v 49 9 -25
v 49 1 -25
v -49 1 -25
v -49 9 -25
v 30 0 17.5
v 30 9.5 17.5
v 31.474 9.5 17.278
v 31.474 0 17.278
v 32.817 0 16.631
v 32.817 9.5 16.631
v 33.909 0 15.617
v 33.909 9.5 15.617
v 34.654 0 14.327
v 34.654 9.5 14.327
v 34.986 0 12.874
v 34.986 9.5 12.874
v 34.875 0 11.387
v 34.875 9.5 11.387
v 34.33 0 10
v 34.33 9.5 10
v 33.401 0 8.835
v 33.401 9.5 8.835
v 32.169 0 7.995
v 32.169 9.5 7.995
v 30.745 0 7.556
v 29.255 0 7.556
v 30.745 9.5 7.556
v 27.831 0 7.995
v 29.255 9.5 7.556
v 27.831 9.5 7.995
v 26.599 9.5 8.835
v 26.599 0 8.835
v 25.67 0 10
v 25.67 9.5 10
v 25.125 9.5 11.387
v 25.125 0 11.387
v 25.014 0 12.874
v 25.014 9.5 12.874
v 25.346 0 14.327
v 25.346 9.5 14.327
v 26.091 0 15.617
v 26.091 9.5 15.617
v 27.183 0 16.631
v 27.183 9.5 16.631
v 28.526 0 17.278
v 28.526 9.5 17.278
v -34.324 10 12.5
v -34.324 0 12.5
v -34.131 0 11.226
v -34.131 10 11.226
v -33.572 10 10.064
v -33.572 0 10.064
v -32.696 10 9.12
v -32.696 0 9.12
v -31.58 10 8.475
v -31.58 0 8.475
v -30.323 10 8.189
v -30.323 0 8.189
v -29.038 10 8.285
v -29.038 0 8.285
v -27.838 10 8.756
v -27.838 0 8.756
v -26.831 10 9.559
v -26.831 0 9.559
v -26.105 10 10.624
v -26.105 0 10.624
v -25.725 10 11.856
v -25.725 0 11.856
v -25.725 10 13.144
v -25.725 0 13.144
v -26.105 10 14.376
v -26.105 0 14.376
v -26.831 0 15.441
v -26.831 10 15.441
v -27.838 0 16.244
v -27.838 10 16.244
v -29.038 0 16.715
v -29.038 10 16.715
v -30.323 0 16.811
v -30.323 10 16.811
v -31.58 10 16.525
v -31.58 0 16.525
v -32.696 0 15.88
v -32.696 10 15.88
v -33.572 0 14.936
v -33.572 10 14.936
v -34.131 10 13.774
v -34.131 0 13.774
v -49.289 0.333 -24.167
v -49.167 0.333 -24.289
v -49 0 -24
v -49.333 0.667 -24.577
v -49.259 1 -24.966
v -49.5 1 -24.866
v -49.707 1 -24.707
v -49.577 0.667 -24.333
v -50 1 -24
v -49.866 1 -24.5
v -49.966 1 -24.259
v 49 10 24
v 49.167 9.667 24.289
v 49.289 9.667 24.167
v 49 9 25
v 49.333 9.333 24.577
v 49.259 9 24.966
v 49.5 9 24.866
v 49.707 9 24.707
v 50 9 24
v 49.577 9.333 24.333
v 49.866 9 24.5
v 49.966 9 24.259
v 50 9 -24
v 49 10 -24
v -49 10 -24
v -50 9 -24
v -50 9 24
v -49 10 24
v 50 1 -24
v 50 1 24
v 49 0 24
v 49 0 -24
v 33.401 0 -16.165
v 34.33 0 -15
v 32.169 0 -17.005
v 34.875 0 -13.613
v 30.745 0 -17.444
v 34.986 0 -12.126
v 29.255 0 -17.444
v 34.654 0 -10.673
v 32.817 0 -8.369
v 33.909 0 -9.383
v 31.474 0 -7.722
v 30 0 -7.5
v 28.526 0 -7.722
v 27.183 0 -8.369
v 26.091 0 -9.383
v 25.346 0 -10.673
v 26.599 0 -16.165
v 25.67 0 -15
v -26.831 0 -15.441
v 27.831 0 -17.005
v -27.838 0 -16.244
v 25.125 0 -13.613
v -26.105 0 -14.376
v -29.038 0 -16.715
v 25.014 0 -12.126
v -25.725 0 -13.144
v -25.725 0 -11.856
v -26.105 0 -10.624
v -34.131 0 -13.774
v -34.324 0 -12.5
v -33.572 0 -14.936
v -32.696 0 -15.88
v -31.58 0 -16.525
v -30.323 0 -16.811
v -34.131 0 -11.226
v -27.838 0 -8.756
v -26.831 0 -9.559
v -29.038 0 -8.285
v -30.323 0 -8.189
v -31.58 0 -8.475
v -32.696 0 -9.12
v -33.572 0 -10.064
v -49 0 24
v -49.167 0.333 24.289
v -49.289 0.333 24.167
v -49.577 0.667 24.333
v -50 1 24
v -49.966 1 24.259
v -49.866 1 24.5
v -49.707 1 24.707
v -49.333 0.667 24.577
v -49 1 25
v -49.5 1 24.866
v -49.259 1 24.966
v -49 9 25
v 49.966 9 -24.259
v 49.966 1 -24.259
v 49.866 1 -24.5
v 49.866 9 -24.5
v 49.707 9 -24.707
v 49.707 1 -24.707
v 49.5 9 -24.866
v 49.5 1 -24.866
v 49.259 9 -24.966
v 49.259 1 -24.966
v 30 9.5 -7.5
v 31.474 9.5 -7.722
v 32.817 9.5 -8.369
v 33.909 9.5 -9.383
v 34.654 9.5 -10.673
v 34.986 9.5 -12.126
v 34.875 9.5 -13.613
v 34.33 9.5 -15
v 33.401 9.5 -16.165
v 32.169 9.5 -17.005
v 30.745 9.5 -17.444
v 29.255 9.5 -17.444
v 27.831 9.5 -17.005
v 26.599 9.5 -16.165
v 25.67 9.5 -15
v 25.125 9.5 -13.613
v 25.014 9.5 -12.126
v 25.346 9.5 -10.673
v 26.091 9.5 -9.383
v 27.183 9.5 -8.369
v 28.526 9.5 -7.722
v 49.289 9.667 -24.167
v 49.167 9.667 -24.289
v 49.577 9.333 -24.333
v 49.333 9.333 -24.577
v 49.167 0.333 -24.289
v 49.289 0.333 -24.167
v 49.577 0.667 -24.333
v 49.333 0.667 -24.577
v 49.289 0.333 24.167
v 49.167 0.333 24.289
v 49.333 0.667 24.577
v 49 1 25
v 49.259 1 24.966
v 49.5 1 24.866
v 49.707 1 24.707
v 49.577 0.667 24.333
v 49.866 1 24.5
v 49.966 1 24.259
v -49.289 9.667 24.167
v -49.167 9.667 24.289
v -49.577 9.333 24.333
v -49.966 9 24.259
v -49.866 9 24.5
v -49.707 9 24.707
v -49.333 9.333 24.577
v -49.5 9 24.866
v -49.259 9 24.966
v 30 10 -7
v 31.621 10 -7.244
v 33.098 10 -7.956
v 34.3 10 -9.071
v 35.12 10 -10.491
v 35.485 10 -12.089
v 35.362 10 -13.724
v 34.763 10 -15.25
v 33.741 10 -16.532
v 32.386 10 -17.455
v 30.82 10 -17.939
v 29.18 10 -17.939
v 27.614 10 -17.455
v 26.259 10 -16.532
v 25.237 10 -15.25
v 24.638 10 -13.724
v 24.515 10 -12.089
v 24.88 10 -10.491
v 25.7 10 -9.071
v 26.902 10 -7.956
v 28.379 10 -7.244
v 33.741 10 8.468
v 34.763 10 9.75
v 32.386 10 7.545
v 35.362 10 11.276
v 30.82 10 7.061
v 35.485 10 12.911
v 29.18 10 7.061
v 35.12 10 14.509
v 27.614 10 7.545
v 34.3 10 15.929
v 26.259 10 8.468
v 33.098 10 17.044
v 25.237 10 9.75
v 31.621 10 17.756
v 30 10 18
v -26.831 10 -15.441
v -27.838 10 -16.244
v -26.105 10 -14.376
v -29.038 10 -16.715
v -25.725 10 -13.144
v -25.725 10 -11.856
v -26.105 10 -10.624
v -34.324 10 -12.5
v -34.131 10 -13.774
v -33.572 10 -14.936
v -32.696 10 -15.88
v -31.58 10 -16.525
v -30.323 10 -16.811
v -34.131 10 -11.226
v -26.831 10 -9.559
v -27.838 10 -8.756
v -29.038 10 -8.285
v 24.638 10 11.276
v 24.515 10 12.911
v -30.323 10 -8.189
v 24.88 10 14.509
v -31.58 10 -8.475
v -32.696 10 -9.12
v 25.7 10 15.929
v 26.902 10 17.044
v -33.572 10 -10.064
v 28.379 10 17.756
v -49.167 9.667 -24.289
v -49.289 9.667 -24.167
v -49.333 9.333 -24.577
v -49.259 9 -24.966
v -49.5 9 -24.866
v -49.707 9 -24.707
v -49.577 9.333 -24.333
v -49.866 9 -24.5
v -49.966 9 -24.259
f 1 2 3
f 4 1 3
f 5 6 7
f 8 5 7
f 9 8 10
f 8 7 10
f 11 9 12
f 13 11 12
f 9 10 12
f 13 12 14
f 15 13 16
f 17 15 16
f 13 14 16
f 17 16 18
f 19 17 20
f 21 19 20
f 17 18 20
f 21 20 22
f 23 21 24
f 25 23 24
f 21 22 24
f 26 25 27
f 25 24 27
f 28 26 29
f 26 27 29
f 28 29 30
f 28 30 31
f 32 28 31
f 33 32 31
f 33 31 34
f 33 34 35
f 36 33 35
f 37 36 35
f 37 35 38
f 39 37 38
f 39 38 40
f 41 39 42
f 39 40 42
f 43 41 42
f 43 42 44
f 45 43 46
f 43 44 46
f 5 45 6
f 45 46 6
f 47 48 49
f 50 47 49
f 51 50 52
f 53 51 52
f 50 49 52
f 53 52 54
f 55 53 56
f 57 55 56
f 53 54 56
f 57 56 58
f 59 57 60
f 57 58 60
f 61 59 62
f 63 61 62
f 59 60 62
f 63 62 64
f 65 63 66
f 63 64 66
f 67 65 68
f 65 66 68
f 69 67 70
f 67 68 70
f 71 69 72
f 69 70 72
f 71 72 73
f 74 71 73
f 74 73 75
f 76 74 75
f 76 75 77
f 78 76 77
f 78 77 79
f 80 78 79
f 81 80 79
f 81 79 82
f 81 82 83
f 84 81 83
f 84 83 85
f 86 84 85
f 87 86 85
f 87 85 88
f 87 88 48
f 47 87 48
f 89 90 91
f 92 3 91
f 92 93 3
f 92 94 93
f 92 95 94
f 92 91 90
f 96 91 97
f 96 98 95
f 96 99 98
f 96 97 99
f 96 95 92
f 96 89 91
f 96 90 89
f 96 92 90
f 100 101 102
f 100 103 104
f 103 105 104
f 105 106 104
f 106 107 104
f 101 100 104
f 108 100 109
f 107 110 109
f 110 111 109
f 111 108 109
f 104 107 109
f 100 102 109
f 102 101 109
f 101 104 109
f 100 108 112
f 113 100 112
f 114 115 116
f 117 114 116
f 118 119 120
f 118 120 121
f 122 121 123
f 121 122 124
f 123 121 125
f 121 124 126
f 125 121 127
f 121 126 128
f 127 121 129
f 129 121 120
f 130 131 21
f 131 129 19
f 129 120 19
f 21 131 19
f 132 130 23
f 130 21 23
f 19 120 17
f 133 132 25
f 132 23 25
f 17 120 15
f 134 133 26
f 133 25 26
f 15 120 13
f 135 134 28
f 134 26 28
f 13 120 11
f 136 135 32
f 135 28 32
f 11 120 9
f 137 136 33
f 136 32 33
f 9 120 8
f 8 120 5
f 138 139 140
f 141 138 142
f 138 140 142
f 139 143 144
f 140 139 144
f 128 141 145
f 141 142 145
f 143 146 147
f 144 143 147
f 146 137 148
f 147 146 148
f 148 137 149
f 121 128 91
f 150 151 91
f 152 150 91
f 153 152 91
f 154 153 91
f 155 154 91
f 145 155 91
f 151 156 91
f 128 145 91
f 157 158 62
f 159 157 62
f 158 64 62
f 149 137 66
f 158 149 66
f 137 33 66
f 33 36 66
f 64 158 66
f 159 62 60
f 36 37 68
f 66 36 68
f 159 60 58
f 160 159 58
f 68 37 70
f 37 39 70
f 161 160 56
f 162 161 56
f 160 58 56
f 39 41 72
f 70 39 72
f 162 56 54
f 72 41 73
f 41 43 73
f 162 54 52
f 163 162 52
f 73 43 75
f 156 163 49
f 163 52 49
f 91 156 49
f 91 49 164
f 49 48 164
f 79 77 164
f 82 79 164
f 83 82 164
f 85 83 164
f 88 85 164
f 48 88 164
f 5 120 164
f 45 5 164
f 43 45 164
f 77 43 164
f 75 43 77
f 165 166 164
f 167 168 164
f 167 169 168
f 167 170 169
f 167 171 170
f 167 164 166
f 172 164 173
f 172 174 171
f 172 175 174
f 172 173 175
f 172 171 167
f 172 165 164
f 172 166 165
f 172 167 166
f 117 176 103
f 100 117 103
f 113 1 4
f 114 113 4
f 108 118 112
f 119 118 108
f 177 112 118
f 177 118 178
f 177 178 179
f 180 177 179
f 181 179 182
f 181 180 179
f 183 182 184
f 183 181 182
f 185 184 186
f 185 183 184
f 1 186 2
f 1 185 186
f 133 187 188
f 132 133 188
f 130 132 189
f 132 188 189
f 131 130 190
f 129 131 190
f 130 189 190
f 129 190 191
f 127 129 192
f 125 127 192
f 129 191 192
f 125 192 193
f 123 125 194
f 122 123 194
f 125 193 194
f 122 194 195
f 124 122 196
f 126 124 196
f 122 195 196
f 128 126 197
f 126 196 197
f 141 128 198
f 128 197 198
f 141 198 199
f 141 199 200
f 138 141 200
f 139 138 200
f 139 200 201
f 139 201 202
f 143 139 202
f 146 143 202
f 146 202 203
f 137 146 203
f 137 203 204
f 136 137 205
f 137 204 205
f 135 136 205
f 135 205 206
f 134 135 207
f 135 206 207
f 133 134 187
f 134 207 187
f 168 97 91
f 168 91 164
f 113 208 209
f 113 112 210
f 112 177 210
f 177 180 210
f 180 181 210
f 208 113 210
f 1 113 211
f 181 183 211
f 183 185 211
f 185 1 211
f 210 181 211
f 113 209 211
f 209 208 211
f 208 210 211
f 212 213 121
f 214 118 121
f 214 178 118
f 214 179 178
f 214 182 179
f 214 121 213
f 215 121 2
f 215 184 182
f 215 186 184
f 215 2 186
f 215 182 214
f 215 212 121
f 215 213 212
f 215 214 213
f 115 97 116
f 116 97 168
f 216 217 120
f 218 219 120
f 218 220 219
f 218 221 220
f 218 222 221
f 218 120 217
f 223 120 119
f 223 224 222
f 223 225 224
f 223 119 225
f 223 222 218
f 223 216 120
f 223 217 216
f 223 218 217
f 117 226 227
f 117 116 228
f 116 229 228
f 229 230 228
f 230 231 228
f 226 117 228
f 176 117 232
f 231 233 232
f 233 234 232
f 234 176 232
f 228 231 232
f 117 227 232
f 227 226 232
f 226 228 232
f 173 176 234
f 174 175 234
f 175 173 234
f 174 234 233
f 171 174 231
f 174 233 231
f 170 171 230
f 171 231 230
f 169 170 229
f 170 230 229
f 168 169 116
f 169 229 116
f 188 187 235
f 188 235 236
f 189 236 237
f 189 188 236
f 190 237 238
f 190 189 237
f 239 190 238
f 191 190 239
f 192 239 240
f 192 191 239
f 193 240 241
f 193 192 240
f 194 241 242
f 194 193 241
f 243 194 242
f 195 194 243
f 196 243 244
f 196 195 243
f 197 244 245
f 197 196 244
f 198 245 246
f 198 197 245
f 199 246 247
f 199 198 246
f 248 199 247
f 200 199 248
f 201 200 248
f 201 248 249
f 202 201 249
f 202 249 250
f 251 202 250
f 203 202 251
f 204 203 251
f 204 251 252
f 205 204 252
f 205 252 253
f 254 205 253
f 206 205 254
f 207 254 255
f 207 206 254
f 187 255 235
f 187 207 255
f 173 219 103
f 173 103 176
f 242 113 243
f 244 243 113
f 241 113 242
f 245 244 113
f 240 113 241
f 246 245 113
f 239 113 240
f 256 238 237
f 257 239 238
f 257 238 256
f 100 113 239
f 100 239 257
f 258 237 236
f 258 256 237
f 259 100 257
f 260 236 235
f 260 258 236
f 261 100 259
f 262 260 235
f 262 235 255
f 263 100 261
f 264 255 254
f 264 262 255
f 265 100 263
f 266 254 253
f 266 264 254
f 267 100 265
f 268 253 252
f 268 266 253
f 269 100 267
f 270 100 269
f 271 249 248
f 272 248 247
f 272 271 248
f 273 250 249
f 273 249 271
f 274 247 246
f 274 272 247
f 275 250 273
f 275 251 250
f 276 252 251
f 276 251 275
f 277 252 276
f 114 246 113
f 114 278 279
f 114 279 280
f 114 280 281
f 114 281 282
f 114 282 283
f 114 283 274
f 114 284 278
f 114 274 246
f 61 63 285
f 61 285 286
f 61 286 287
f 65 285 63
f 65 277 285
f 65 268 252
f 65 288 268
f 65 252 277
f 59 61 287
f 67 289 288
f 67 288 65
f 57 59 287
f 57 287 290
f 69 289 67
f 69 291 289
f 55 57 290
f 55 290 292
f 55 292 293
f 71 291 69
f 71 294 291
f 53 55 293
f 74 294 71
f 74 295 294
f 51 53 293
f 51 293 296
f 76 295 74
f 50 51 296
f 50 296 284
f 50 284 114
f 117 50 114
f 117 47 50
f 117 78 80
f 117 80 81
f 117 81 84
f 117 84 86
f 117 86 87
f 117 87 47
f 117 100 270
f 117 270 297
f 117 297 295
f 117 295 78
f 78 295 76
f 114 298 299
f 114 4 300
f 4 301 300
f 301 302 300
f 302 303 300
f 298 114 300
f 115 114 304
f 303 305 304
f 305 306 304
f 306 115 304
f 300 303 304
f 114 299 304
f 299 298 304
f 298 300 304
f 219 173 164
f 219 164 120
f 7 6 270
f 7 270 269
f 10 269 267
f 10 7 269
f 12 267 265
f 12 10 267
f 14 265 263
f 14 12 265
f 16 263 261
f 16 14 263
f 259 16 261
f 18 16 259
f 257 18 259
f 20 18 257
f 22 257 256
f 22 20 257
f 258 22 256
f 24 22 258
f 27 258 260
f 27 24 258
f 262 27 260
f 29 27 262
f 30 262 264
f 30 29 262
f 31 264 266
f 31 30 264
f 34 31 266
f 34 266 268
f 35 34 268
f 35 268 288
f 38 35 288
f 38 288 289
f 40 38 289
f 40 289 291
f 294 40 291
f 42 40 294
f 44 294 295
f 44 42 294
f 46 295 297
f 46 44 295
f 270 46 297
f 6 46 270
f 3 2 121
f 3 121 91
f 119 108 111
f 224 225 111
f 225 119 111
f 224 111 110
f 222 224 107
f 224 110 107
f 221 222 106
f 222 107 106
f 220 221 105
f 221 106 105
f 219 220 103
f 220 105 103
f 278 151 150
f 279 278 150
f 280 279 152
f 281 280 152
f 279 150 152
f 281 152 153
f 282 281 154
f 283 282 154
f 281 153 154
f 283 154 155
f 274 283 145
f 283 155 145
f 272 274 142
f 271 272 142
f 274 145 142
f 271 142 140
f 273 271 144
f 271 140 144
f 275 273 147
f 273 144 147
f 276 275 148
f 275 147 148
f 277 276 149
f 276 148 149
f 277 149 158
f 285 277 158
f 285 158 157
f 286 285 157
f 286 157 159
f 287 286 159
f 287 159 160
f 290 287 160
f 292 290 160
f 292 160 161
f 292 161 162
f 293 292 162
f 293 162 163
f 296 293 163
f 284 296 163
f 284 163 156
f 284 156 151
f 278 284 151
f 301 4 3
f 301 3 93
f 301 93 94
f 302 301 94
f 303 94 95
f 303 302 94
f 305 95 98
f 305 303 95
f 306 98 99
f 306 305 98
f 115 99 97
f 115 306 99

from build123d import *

# Parameters (mm, degrees)
SKETCH_1_W          = 100
SKETCH_1_H          = 50
EXTRUDE_1_DEPTH     = 10
SKETCH_2_R          = 5
EXTRUDE_2_DEPTH     = 10
HOLE_WIZARD_1_D     = 8.647
HOLE_WIZARD_1_DEPTH = 26.2
HOLE_WIZARD_1_TIP   = 2.597820886
FILLET_3_R          = 1
CHAMFER_2_SIZE      = 1
CHAMFER_3_SIZE      = 0.5


with BuildPart() as part:
    # 草圖1 → 擠出1 (new body)
    with BuildSketch(Plane(origin=(0, 0, 0), x_dir=(-1, 0, 0), z_dir=(0, 1, 0))):
        Rectangle(SKETCH_1_W, SKETCH_1_H)
    extrude(amount=EXTRUDE_1_DEPTH)

    # 草圖2 → 擠出2 (cut)
    with BuildSketch(Plane(origin=(0, 10, 0), x_dir=(-1, 0, 0), z_dir=(0, 1, 0))):
        with Locations(Location((-30, -12.5, 0), (0, 0, 90))):
            Circle(SKETCH_2_R)
        with Locations(Location((-30, 12.5, 0), (0, 0, 90))):
            Circle(SKETCH_2_R)
    extrude(amount=-EXTRUDE_2_DEPTH, mode=Mode.SUBTRACT)

    # 孔1
    with Locations(Plane(origin=(0, 10, 0), x_dir=(1, 0, 0), z_dir=(0, 1, 0))):
        with Locations((-30, -12.5), (-30, 12.5)):
            Hole(HOLE_WIZARD_1_D / 2, depth=HOLE_WIZARD_1_DEPTH)
            with Locations((0, 0, -(HOLE_WIZARD_1_DEPTH + HOLE_WIZARD_1_TIP / 2))):  # 118° drill point
                Cone(0, HOLE_WIZARD_1_D / 2, HOLE_WIZARD_1_TIP, mode=Mode.SUBTRACT)

    # 圓角3
    fillet_3_edges = [part.edges().sort_by_distance(p)[0] for p in [
        (-50, 5, -25),
        (50, 5, -25),
        (50, 5, 25),
        (-50, 5, 25),
    ]]
    fillet(fillet_3_edges, radius=FILLET_3_R)

    # 倒角2
    chamfer_2_edges = [part.edges().sort_by_distance(p)[0] for p in [
        (0, 0, -25),
        (0, 10, -25),
        (-50, 0, 0),
        (50, 0, 0),
        (0, 0, 25),
        (-49.707106781, 0, 24.707106781),
        (-49.707106781, 0, -24.707106781),
        (49.707106781, 0, 24.707106781),
        (49.707106781, 0, -24.707106781),
        (50, 10, 0),
        (-50, 10, 0),
        (0, 10, 25),
        (-49.707106781, 10, 24.707106781),
        (-49.707106781, 10, -24.707106781),
        (49.707106781, 10, 24.707106781),
        (49.707106781, 10, -24.707106781),
    ]]
    chamfer(chamfer_2_edges, length=CHAMFER_2_SIZE)

    # 倒角3
    chamfer_3_edges = [part.edges().sort_by_distance(p)[0] for p in [
        (30, 10, -17.5),
        (30, 10, 7.5),
    ]]
    chamfer(chamfer_3_edges, length=CHAMFER_3_SIZE)


solid = part.part
